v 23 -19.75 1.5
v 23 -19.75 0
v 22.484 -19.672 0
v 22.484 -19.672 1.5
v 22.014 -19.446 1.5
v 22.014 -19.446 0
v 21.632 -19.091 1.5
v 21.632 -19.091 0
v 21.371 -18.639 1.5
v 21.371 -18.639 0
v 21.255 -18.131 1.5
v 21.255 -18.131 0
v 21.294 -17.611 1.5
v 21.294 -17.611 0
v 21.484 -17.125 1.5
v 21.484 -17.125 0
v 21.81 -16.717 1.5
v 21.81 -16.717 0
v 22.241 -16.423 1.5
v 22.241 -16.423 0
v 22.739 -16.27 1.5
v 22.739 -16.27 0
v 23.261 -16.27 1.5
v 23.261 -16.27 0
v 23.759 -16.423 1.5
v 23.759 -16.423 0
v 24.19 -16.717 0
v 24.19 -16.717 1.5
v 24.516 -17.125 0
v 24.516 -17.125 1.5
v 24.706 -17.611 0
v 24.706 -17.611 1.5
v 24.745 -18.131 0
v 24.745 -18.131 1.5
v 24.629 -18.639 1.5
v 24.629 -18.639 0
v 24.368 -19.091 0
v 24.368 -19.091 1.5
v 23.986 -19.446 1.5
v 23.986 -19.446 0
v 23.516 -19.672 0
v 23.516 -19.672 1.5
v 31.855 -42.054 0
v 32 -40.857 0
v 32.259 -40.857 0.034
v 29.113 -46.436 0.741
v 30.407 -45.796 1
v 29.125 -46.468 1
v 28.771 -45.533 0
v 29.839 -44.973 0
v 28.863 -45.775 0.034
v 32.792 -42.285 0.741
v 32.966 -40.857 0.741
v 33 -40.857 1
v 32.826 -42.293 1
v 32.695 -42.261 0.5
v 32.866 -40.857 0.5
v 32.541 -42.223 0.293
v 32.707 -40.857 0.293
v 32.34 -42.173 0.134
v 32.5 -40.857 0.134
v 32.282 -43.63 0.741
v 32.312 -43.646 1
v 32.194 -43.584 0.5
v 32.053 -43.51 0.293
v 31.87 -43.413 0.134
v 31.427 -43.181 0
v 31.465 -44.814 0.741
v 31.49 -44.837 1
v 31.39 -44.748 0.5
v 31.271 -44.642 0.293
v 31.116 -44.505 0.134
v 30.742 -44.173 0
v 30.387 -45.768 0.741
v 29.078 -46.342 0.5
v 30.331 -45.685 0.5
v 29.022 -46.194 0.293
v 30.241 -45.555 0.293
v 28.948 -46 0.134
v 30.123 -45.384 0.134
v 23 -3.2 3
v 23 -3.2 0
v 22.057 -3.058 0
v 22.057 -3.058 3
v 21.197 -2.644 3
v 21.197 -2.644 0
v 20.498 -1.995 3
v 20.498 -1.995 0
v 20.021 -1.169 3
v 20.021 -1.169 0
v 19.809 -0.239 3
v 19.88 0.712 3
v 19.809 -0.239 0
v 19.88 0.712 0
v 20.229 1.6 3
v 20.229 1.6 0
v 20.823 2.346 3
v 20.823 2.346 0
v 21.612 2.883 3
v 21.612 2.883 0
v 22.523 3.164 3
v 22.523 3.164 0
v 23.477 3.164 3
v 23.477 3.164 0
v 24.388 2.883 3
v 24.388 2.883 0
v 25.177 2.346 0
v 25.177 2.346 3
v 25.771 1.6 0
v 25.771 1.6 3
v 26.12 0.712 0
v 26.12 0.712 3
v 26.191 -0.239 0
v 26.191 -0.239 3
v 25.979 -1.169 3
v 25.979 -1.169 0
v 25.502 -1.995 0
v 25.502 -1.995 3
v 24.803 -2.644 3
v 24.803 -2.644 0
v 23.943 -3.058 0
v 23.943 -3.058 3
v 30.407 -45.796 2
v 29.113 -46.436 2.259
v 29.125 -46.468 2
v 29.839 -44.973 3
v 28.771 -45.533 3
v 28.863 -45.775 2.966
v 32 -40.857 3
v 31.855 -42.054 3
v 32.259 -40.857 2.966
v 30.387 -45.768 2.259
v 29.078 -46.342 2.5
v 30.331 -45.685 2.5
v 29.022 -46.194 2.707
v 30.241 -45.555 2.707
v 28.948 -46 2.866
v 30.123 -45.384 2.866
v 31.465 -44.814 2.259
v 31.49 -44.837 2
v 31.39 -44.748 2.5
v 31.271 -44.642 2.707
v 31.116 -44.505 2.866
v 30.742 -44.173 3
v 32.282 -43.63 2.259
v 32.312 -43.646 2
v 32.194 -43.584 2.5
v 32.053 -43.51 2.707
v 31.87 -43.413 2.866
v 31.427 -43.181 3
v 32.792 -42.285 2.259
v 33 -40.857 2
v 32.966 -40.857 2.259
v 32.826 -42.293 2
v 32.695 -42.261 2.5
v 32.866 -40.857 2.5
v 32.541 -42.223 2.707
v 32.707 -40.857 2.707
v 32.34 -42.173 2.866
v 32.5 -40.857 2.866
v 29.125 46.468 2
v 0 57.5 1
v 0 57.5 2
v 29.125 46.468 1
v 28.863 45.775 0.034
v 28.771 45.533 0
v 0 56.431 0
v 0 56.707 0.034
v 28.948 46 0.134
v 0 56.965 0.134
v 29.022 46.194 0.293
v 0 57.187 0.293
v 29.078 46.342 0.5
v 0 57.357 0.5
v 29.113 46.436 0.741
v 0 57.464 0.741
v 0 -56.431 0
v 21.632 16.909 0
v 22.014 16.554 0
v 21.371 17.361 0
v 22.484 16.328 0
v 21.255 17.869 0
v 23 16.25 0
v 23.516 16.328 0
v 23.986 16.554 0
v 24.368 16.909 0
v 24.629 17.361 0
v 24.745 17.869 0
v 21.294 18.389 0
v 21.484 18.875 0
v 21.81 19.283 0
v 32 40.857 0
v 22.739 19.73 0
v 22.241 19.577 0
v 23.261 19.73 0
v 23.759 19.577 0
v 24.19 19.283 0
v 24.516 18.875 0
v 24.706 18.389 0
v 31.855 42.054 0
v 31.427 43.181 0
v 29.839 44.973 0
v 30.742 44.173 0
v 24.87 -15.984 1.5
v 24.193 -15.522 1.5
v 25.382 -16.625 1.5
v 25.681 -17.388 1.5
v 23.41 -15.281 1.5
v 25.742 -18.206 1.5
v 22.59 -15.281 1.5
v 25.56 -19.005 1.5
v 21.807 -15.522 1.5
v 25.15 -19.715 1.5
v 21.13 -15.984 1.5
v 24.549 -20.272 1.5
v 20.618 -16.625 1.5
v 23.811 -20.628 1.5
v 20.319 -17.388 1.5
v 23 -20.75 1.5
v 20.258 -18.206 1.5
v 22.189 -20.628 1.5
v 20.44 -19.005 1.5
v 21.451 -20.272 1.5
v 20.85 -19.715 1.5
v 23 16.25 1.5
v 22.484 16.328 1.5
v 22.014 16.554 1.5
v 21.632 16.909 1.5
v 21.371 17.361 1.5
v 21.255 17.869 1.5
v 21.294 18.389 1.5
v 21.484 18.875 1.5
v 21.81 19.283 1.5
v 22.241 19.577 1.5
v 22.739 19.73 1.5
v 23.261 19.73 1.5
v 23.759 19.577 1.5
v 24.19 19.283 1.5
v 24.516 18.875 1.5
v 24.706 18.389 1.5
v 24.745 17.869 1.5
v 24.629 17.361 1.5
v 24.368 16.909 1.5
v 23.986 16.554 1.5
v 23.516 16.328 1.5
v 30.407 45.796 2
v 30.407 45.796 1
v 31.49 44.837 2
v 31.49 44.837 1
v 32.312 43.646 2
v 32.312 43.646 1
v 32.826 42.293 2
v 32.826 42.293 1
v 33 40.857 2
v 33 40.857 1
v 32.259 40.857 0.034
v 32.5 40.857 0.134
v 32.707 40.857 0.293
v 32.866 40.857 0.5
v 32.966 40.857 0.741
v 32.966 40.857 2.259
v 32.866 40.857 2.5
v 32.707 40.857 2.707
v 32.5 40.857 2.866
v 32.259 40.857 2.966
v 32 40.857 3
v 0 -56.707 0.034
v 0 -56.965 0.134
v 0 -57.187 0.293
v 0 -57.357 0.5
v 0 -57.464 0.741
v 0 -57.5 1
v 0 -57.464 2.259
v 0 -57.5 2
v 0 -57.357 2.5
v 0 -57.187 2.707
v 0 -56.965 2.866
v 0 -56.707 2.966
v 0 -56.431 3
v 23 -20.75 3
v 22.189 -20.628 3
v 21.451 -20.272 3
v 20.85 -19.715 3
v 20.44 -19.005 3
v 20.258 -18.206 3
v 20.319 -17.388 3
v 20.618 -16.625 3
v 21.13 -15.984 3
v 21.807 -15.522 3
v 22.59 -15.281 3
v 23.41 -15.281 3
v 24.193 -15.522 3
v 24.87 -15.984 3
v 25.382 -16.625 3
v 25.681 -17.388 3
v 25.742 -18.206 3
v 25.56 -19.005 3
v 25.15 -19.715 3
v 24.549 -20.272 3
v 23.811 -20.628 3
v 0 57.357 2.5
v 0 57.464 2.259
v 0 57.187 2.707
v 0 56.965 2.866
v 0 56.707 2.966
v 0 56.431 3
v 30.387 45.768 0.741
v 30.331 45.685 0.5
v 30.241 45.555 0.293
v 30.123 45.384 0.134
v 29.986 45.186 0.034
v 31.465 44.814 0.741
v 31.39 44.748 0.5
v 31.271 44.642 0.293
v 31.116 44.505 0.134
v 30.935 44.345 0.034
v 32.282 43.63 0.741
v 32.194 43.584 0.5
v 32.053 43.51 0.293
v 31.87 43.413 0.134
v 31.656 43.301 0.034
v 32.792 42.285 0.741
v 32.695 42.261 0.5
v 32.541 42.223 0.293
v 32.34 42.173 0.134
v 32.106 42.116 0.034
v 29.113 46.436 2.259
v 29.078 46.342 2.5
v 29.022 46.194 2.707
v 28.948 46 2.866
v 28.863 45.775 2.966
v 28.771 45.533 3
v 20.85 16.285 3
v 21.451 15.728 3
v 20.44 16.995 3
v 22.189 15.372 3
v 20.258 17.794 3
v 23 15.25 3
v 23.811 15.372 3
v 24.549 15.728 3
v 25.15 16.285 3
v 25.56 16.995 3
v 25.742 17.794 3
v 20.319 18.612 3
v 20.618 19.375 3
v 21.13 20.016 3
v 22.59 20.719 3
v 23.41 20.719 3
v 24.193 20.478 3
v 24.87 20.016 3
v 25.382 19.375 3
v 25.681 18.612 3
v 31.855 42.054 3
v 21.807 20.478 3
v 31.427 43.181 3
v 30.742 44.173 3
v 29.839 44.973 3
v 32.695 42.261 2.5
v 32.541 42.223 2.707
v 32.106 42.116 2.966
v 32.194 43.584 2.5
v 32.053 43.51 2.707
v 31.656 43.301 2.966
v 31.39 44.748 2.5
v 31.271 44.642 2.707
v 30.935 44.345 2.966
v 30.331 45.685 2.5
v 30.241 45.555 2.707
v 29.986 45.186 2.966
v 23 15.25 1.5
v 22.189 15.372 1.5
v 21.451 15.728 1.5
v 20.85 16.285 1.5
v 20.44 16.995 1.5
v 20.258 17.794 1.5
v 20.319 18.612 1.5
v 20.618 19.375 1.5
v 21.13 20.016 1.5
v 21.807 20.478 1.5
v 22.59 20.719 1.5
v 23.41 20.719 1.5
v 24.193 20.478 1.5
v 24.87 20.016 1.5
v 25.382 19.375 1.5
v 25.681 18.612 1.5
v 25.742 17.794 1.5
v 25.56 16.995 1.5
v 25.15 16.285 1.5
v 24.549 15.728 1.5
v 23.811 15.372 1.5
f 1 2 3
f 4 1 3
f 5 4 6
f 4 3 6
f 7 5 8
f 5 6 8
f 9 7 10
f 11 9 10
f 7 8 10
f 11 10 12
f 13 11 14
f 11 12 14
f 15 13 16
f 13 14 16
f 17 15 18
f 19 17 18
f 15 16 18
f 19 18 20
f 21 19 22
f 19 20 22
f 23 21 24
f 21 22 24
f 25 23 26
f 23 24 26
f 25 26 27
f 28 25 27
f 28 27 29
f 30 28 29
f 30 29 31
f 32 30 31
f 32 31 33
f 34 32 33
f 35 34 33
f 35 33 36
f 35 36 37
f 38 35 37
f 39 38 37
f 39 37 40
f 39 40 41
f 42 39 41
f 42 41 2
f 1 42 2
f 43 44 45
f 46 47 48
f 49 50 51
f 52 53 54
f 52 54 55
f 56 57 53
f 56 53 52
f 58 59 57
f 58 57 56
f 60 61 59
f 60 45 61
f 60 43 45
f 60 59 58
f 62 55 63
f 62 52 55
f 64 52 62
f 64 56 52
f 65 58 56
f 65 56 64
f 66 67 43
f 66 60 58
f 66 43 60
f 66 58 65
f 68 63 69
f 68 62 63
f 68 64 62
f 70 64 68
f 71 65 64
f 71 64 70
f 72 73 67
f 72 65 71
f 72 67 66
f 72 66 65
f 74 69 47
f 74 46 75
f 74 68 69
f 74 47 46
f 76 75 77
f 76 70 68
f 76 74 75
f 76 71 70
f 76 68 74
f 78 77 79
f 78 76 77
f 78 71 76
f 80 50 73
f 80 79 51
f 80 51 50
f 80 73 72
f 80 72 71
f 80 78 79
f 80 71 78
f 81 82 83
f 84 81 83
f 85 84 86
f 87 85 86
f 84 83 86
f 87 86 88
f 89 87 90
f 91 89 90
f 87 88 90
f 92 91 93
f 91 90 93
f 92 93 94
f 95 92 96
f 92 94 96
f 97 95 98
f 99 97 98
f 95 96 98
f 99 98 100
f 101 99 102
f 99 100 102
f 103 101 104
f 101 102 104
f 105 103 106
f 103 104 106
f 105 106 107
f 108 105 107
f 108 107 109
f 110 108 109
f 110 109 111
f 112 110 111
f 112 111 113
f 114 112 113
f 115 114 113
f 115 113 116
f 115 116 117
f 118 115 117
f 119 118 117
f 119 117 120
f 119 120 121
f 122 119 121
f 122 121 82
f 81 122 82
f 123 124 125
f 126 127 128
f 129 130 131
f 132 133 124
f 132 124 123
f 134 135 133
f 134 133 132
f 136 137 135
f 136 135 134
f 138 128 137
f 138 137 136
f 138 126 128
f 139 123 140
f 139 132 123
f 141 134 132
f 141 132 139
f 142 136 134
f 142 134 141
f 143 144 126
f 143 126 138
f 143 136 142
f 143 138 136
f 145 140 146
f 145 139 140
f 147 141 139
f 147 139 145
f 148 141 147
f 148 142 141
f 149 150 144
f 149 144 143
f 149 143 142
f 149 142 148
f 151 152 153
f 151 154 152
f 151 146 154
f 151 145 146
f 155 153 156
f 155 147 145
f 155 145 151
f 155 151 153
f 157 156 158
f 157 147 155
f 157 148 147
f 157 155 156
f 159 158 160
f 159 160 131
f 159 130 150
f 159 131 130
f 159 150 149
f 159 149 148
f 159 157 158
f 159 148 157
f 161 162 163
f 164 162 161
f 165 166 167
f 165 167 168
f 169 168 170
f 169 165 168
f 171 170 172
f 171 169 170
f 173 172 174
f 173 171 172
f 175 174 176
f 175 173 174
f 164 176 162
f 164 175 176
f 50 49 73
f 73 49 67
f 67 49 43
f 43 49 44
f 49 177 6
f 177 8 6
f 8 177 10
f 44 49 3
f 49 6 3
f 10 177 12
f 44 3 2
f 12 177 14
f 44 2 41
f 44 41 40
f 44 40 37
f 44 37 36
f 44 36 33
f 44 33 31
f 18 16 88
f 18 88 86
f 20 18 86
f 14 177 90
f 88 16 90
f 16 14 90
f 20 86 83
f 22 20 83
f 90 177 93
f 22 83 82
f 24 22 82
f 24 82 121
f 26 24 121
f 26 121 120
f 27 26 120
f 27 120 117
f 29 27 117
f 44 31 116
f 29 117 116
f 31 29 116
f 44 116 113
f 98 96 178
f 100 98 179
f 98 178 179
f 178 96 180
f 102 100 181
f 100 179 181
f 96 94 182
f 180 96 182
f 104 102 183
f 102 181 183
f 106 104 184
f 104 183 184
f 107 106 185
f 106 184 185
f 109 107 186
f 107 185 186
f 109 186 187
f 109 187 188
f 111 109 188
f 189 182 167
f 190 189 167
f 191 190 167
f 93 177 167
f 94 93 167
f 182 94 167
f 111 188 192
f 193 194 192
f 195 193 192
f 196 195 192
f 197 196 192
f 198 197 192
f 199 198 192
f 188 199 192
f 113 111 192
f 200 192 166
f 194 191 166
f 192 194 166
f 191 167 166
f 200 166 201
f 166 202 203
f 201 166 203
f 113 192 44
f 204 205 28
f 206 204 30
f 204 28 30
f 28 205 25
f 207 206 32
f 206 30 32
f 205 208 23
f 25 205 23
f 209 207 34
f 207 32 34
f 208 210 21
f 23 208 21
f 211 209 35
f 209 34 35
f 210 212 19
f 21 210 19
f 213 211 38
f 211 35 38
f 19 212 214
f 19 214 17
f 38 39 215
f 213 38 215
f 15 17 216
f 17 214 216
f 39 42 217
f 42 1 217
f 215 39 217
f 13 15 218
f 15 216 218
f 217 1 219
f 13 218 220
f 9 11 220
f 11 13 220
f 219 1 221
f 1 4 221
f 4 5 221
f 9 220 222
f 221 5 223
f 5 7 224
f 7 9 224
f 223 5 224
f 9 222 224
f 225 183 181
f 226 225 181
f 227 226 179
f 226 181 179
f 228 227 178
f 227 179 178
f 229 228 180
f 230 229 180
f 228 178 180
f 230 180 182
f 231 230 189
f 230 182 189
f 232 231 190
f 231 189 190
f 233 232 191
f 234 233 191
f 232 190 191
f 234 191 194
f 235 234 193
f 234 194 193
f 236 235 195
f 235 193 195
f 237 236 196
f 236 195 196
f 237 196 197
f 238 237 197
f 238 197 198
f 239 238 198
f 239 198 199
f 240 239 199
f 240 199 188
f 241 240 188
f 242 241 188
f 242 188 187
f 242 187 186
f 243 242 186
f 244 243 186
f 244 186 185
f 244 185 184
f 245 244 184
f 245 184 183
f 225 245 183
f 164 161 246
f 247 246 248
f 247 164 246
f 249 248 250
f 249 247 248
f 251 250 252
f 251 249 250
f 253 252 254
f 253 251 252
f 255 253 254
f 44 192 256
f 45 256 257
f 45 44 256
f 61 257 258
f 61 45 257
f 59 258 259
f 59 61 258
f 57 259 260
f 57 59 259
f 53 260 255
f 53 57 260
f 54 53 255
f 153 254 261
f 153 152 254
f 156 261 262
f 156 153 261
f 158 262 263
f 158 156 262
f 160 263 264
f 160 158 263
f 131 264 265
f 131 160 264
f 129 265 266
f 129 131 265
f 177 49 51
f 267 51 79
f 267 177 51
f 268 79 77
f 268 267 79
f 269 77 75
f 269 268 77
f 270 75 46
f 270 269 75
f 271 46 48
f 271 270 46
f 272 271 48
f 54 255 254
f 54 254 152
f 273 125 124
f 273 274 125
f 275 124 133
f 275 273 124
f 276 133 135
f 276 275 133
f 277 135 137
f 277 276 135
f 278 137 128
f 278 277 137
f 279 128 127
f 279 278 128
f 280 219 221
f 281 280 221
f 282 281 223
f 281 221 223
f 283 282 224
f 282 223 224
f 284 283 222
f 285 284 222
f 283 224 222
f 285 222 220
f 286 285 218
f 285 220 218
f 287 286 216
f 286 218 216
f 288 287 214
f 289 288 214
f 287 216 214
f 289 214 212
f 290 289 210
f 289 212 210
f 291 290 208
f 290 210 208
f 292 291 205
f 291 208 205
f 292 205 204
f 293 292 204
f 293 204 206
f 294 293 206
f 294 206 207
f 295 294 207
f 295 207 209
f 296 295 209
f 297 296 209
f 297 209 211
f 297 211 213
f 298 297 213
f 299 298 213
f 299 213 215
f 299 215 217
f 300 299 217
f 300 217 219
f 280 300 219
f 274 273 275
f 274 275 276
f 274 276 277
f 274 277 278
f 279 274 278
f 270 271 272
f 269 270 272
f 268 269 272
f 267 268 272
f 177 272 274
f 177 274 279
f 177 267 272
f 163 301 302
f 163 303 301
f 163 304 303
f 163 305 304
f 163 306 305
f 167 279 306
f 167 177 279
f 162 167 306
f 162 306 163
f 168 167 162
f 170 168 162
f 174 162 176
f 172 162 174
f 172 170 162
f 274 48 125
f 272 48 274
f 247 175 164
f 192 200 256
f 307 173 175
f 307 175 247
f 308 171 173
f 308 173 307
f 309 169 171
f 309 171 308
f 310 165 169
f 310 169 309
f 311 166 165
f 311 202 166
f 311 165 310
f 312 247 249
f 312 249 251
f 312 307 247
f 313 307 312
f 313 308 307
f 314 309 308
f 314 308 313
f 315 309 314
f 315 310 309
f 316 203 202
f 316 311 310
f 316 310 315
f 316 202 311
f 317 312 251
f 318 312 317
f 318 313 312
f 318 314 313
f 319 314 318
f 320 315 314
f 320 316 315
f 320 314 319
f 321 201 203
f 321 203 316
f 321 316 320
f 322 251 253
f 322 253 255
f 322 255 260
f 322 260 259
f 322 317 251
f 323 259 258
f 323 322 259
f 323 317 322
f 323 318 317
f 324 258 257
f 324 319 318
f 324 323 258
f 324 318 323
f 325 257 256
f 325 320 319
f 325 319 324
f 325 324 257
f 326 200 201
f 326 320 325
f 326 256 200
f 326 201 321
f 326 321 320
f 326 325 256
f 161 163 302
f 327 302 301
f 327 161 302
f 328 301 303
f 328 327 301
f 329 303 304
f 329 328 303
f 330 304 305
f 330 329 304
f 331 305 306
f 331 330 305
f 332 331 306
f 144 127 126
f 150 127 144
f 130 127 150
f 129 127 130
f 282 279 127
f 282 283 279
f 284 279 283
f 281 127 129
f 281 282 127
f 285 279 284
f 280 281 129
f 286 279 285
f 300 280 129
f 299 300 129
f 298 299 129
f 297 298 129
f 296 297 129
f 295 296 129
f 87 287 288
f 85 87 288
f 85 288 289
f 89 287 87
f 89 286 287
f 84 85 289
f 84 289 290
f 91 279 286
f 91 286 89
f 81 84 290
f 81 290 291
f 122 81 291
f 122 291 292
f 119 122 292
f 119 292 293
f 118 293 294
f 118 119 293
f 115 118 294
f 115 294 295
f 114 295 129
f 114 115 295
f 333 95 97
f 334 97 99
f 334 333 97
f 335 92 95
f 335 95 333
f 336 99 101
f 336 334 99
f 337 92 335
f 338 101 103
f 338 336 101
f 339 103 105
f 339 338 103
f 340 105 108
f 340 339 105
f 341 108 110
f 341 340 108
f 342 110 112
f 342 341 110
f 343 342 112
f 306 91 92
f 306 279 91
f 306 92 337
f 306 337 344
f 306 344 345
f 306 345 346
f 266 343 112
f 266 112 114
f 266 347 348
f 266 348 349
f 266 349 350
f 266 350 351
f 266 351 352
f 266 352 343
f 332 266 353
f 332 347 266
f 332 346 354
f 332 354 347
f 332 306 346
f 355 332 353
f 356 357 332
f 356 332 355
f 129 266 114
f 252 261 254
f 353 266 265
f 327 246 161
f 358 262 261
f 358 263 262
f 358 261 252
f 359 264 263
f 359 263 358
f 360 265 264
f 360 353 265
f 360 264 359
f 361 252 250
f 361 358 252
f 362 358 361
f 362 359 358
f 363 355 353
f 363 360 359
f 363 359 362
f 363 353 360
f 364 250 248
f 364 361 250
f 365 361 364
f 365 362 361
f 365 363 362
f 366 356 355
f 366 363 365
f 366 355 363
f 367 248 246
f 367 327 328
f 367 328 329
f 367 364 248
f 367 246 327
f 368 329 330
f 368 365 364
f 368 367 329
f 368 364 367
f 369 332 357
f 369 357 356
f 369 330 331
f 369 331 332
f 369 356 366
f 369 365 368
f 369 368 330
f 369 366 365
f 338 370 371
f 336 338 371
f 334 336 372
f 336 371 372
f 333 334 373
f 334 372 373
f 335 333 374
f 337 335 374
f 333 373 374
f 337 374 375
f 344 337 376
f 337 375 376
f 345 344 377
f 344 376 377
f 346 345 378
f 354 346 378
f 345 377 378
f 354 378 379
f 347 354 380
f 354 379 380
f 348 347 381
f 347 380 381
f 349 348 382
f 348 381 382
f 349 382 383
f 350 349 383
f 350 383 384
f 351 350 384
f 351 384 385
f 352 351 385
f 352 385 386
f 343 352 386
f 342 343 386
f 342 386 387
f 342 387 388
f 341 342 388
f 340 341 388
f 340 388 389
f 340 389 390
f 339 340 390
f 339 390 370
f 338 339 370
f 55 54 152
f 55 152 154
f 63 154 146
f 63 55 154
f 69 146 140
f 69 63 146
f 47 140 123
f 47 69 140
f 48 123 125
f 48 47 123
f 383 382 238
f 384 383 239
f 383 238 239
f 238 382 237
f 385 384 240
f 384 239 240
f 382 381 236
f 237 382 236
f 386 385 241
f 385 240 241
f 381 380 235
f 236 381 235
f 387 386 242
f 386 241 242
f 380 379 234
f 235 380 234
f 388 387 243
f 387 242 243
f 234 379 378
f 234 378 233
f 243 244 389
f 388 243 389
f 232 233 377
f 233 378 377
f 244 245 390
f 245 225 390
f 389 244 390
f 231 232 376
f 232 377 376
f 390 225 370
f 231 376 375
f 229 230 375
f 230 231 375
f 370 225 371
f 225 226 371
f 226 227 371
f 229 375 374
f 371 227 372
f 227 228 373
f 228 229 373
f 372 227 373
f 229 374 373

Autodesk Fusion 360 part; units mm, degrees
sketch "Sketch1" plane through (0, 0, 0) normal (0, 0, 1) x (1, 0, 0)
  line L0 (0, 0) -> (0, 57.5)
  line L1 (0, 57.5) -> (29.1254, 46.4677)
  line L2 (33, 40.8567) -> (33, -40.8567)
  line L3 (29.1254, -46.4677) -> (0, -57.5)
  line L4 (0, -57.5) -> (0, 0)
  arc A0 (29.1254, -46.4677) -> (33, -40.8567) centre (27, -40.8567) ccw
  arc A1 (33, 40.8567) -> (29.1254, 46.4677) centre (27, 40.8567) ccw
  point P0 (33, 45)
  point P1 (33, -45)
  dimension "d1" = 90
  dimension "d2" = 115
  dimension "d3" = 33
  dimension "d4" = 6
extrude "Extrude1" add sketch "Sketch1" along normal blind 3
sketch "Sketch2" plane through (0, 0, 3) normal (0, 0, 1) x (1, 0, 0)
  arc A0 (29.1254, -46.4677) -> (33, -40.8567) centre (27, -40.8567) ccw
  line L0 (33, -40.8567) -> (33, 40.8567)
  arc A1 (33, 40.8567) -> (29.1254, 46.4677) centre (27, 40.8567) ccw
  line L1 (29.1254, 46.4677) -> (0, 57.5)
  line L2 (0, 57.5) -> (0, -57.5)
  line L3 (0, -57.5) -> (29.1254, -46.4677)
  line L4 (23, -48.7879) -> (23, 48.7879) construction
  circle A2 centre (23, 0) radius 3.2
  circle A3 centre (23, 18) radius 1.5
  circle A4 centre (23, -18) radius 1.5
  dimension "d7" = 10
  dimension "d8" = 6.4
  dimension "d9" = 3
  dimension "d11" = 36
  dimension "d12" = 18
hole "Hole1" at (23, 0, 3) direction (0, 0, -1) diameter 6.4 end up to surface (3 mm away)
hole "Hole2" at (23, -18, 3) at (23, 18, 3) direction (0, 0, -1) diameter 3.5 depth 3 tip angle 118 counterbore diameter 5.5 counterbore depth 1.5
fillet "Fillet1" radius 1 10 edges at (14.5627, -51.9838, 3) (31.9372, -44.2661, 3) (33, 0, 3) (31.9372, 44.2661, 3) (14.5627, 51.9838, 3) (14.5627, 51.9838, 0) (31.9372, 44.2661, 0) (33, 0, 0) (31.9372, -44.2661, 0) (14.5627, -51.9838, 0)
equation "d8 = ( 25.6 / 4 ) * 1 mm"
